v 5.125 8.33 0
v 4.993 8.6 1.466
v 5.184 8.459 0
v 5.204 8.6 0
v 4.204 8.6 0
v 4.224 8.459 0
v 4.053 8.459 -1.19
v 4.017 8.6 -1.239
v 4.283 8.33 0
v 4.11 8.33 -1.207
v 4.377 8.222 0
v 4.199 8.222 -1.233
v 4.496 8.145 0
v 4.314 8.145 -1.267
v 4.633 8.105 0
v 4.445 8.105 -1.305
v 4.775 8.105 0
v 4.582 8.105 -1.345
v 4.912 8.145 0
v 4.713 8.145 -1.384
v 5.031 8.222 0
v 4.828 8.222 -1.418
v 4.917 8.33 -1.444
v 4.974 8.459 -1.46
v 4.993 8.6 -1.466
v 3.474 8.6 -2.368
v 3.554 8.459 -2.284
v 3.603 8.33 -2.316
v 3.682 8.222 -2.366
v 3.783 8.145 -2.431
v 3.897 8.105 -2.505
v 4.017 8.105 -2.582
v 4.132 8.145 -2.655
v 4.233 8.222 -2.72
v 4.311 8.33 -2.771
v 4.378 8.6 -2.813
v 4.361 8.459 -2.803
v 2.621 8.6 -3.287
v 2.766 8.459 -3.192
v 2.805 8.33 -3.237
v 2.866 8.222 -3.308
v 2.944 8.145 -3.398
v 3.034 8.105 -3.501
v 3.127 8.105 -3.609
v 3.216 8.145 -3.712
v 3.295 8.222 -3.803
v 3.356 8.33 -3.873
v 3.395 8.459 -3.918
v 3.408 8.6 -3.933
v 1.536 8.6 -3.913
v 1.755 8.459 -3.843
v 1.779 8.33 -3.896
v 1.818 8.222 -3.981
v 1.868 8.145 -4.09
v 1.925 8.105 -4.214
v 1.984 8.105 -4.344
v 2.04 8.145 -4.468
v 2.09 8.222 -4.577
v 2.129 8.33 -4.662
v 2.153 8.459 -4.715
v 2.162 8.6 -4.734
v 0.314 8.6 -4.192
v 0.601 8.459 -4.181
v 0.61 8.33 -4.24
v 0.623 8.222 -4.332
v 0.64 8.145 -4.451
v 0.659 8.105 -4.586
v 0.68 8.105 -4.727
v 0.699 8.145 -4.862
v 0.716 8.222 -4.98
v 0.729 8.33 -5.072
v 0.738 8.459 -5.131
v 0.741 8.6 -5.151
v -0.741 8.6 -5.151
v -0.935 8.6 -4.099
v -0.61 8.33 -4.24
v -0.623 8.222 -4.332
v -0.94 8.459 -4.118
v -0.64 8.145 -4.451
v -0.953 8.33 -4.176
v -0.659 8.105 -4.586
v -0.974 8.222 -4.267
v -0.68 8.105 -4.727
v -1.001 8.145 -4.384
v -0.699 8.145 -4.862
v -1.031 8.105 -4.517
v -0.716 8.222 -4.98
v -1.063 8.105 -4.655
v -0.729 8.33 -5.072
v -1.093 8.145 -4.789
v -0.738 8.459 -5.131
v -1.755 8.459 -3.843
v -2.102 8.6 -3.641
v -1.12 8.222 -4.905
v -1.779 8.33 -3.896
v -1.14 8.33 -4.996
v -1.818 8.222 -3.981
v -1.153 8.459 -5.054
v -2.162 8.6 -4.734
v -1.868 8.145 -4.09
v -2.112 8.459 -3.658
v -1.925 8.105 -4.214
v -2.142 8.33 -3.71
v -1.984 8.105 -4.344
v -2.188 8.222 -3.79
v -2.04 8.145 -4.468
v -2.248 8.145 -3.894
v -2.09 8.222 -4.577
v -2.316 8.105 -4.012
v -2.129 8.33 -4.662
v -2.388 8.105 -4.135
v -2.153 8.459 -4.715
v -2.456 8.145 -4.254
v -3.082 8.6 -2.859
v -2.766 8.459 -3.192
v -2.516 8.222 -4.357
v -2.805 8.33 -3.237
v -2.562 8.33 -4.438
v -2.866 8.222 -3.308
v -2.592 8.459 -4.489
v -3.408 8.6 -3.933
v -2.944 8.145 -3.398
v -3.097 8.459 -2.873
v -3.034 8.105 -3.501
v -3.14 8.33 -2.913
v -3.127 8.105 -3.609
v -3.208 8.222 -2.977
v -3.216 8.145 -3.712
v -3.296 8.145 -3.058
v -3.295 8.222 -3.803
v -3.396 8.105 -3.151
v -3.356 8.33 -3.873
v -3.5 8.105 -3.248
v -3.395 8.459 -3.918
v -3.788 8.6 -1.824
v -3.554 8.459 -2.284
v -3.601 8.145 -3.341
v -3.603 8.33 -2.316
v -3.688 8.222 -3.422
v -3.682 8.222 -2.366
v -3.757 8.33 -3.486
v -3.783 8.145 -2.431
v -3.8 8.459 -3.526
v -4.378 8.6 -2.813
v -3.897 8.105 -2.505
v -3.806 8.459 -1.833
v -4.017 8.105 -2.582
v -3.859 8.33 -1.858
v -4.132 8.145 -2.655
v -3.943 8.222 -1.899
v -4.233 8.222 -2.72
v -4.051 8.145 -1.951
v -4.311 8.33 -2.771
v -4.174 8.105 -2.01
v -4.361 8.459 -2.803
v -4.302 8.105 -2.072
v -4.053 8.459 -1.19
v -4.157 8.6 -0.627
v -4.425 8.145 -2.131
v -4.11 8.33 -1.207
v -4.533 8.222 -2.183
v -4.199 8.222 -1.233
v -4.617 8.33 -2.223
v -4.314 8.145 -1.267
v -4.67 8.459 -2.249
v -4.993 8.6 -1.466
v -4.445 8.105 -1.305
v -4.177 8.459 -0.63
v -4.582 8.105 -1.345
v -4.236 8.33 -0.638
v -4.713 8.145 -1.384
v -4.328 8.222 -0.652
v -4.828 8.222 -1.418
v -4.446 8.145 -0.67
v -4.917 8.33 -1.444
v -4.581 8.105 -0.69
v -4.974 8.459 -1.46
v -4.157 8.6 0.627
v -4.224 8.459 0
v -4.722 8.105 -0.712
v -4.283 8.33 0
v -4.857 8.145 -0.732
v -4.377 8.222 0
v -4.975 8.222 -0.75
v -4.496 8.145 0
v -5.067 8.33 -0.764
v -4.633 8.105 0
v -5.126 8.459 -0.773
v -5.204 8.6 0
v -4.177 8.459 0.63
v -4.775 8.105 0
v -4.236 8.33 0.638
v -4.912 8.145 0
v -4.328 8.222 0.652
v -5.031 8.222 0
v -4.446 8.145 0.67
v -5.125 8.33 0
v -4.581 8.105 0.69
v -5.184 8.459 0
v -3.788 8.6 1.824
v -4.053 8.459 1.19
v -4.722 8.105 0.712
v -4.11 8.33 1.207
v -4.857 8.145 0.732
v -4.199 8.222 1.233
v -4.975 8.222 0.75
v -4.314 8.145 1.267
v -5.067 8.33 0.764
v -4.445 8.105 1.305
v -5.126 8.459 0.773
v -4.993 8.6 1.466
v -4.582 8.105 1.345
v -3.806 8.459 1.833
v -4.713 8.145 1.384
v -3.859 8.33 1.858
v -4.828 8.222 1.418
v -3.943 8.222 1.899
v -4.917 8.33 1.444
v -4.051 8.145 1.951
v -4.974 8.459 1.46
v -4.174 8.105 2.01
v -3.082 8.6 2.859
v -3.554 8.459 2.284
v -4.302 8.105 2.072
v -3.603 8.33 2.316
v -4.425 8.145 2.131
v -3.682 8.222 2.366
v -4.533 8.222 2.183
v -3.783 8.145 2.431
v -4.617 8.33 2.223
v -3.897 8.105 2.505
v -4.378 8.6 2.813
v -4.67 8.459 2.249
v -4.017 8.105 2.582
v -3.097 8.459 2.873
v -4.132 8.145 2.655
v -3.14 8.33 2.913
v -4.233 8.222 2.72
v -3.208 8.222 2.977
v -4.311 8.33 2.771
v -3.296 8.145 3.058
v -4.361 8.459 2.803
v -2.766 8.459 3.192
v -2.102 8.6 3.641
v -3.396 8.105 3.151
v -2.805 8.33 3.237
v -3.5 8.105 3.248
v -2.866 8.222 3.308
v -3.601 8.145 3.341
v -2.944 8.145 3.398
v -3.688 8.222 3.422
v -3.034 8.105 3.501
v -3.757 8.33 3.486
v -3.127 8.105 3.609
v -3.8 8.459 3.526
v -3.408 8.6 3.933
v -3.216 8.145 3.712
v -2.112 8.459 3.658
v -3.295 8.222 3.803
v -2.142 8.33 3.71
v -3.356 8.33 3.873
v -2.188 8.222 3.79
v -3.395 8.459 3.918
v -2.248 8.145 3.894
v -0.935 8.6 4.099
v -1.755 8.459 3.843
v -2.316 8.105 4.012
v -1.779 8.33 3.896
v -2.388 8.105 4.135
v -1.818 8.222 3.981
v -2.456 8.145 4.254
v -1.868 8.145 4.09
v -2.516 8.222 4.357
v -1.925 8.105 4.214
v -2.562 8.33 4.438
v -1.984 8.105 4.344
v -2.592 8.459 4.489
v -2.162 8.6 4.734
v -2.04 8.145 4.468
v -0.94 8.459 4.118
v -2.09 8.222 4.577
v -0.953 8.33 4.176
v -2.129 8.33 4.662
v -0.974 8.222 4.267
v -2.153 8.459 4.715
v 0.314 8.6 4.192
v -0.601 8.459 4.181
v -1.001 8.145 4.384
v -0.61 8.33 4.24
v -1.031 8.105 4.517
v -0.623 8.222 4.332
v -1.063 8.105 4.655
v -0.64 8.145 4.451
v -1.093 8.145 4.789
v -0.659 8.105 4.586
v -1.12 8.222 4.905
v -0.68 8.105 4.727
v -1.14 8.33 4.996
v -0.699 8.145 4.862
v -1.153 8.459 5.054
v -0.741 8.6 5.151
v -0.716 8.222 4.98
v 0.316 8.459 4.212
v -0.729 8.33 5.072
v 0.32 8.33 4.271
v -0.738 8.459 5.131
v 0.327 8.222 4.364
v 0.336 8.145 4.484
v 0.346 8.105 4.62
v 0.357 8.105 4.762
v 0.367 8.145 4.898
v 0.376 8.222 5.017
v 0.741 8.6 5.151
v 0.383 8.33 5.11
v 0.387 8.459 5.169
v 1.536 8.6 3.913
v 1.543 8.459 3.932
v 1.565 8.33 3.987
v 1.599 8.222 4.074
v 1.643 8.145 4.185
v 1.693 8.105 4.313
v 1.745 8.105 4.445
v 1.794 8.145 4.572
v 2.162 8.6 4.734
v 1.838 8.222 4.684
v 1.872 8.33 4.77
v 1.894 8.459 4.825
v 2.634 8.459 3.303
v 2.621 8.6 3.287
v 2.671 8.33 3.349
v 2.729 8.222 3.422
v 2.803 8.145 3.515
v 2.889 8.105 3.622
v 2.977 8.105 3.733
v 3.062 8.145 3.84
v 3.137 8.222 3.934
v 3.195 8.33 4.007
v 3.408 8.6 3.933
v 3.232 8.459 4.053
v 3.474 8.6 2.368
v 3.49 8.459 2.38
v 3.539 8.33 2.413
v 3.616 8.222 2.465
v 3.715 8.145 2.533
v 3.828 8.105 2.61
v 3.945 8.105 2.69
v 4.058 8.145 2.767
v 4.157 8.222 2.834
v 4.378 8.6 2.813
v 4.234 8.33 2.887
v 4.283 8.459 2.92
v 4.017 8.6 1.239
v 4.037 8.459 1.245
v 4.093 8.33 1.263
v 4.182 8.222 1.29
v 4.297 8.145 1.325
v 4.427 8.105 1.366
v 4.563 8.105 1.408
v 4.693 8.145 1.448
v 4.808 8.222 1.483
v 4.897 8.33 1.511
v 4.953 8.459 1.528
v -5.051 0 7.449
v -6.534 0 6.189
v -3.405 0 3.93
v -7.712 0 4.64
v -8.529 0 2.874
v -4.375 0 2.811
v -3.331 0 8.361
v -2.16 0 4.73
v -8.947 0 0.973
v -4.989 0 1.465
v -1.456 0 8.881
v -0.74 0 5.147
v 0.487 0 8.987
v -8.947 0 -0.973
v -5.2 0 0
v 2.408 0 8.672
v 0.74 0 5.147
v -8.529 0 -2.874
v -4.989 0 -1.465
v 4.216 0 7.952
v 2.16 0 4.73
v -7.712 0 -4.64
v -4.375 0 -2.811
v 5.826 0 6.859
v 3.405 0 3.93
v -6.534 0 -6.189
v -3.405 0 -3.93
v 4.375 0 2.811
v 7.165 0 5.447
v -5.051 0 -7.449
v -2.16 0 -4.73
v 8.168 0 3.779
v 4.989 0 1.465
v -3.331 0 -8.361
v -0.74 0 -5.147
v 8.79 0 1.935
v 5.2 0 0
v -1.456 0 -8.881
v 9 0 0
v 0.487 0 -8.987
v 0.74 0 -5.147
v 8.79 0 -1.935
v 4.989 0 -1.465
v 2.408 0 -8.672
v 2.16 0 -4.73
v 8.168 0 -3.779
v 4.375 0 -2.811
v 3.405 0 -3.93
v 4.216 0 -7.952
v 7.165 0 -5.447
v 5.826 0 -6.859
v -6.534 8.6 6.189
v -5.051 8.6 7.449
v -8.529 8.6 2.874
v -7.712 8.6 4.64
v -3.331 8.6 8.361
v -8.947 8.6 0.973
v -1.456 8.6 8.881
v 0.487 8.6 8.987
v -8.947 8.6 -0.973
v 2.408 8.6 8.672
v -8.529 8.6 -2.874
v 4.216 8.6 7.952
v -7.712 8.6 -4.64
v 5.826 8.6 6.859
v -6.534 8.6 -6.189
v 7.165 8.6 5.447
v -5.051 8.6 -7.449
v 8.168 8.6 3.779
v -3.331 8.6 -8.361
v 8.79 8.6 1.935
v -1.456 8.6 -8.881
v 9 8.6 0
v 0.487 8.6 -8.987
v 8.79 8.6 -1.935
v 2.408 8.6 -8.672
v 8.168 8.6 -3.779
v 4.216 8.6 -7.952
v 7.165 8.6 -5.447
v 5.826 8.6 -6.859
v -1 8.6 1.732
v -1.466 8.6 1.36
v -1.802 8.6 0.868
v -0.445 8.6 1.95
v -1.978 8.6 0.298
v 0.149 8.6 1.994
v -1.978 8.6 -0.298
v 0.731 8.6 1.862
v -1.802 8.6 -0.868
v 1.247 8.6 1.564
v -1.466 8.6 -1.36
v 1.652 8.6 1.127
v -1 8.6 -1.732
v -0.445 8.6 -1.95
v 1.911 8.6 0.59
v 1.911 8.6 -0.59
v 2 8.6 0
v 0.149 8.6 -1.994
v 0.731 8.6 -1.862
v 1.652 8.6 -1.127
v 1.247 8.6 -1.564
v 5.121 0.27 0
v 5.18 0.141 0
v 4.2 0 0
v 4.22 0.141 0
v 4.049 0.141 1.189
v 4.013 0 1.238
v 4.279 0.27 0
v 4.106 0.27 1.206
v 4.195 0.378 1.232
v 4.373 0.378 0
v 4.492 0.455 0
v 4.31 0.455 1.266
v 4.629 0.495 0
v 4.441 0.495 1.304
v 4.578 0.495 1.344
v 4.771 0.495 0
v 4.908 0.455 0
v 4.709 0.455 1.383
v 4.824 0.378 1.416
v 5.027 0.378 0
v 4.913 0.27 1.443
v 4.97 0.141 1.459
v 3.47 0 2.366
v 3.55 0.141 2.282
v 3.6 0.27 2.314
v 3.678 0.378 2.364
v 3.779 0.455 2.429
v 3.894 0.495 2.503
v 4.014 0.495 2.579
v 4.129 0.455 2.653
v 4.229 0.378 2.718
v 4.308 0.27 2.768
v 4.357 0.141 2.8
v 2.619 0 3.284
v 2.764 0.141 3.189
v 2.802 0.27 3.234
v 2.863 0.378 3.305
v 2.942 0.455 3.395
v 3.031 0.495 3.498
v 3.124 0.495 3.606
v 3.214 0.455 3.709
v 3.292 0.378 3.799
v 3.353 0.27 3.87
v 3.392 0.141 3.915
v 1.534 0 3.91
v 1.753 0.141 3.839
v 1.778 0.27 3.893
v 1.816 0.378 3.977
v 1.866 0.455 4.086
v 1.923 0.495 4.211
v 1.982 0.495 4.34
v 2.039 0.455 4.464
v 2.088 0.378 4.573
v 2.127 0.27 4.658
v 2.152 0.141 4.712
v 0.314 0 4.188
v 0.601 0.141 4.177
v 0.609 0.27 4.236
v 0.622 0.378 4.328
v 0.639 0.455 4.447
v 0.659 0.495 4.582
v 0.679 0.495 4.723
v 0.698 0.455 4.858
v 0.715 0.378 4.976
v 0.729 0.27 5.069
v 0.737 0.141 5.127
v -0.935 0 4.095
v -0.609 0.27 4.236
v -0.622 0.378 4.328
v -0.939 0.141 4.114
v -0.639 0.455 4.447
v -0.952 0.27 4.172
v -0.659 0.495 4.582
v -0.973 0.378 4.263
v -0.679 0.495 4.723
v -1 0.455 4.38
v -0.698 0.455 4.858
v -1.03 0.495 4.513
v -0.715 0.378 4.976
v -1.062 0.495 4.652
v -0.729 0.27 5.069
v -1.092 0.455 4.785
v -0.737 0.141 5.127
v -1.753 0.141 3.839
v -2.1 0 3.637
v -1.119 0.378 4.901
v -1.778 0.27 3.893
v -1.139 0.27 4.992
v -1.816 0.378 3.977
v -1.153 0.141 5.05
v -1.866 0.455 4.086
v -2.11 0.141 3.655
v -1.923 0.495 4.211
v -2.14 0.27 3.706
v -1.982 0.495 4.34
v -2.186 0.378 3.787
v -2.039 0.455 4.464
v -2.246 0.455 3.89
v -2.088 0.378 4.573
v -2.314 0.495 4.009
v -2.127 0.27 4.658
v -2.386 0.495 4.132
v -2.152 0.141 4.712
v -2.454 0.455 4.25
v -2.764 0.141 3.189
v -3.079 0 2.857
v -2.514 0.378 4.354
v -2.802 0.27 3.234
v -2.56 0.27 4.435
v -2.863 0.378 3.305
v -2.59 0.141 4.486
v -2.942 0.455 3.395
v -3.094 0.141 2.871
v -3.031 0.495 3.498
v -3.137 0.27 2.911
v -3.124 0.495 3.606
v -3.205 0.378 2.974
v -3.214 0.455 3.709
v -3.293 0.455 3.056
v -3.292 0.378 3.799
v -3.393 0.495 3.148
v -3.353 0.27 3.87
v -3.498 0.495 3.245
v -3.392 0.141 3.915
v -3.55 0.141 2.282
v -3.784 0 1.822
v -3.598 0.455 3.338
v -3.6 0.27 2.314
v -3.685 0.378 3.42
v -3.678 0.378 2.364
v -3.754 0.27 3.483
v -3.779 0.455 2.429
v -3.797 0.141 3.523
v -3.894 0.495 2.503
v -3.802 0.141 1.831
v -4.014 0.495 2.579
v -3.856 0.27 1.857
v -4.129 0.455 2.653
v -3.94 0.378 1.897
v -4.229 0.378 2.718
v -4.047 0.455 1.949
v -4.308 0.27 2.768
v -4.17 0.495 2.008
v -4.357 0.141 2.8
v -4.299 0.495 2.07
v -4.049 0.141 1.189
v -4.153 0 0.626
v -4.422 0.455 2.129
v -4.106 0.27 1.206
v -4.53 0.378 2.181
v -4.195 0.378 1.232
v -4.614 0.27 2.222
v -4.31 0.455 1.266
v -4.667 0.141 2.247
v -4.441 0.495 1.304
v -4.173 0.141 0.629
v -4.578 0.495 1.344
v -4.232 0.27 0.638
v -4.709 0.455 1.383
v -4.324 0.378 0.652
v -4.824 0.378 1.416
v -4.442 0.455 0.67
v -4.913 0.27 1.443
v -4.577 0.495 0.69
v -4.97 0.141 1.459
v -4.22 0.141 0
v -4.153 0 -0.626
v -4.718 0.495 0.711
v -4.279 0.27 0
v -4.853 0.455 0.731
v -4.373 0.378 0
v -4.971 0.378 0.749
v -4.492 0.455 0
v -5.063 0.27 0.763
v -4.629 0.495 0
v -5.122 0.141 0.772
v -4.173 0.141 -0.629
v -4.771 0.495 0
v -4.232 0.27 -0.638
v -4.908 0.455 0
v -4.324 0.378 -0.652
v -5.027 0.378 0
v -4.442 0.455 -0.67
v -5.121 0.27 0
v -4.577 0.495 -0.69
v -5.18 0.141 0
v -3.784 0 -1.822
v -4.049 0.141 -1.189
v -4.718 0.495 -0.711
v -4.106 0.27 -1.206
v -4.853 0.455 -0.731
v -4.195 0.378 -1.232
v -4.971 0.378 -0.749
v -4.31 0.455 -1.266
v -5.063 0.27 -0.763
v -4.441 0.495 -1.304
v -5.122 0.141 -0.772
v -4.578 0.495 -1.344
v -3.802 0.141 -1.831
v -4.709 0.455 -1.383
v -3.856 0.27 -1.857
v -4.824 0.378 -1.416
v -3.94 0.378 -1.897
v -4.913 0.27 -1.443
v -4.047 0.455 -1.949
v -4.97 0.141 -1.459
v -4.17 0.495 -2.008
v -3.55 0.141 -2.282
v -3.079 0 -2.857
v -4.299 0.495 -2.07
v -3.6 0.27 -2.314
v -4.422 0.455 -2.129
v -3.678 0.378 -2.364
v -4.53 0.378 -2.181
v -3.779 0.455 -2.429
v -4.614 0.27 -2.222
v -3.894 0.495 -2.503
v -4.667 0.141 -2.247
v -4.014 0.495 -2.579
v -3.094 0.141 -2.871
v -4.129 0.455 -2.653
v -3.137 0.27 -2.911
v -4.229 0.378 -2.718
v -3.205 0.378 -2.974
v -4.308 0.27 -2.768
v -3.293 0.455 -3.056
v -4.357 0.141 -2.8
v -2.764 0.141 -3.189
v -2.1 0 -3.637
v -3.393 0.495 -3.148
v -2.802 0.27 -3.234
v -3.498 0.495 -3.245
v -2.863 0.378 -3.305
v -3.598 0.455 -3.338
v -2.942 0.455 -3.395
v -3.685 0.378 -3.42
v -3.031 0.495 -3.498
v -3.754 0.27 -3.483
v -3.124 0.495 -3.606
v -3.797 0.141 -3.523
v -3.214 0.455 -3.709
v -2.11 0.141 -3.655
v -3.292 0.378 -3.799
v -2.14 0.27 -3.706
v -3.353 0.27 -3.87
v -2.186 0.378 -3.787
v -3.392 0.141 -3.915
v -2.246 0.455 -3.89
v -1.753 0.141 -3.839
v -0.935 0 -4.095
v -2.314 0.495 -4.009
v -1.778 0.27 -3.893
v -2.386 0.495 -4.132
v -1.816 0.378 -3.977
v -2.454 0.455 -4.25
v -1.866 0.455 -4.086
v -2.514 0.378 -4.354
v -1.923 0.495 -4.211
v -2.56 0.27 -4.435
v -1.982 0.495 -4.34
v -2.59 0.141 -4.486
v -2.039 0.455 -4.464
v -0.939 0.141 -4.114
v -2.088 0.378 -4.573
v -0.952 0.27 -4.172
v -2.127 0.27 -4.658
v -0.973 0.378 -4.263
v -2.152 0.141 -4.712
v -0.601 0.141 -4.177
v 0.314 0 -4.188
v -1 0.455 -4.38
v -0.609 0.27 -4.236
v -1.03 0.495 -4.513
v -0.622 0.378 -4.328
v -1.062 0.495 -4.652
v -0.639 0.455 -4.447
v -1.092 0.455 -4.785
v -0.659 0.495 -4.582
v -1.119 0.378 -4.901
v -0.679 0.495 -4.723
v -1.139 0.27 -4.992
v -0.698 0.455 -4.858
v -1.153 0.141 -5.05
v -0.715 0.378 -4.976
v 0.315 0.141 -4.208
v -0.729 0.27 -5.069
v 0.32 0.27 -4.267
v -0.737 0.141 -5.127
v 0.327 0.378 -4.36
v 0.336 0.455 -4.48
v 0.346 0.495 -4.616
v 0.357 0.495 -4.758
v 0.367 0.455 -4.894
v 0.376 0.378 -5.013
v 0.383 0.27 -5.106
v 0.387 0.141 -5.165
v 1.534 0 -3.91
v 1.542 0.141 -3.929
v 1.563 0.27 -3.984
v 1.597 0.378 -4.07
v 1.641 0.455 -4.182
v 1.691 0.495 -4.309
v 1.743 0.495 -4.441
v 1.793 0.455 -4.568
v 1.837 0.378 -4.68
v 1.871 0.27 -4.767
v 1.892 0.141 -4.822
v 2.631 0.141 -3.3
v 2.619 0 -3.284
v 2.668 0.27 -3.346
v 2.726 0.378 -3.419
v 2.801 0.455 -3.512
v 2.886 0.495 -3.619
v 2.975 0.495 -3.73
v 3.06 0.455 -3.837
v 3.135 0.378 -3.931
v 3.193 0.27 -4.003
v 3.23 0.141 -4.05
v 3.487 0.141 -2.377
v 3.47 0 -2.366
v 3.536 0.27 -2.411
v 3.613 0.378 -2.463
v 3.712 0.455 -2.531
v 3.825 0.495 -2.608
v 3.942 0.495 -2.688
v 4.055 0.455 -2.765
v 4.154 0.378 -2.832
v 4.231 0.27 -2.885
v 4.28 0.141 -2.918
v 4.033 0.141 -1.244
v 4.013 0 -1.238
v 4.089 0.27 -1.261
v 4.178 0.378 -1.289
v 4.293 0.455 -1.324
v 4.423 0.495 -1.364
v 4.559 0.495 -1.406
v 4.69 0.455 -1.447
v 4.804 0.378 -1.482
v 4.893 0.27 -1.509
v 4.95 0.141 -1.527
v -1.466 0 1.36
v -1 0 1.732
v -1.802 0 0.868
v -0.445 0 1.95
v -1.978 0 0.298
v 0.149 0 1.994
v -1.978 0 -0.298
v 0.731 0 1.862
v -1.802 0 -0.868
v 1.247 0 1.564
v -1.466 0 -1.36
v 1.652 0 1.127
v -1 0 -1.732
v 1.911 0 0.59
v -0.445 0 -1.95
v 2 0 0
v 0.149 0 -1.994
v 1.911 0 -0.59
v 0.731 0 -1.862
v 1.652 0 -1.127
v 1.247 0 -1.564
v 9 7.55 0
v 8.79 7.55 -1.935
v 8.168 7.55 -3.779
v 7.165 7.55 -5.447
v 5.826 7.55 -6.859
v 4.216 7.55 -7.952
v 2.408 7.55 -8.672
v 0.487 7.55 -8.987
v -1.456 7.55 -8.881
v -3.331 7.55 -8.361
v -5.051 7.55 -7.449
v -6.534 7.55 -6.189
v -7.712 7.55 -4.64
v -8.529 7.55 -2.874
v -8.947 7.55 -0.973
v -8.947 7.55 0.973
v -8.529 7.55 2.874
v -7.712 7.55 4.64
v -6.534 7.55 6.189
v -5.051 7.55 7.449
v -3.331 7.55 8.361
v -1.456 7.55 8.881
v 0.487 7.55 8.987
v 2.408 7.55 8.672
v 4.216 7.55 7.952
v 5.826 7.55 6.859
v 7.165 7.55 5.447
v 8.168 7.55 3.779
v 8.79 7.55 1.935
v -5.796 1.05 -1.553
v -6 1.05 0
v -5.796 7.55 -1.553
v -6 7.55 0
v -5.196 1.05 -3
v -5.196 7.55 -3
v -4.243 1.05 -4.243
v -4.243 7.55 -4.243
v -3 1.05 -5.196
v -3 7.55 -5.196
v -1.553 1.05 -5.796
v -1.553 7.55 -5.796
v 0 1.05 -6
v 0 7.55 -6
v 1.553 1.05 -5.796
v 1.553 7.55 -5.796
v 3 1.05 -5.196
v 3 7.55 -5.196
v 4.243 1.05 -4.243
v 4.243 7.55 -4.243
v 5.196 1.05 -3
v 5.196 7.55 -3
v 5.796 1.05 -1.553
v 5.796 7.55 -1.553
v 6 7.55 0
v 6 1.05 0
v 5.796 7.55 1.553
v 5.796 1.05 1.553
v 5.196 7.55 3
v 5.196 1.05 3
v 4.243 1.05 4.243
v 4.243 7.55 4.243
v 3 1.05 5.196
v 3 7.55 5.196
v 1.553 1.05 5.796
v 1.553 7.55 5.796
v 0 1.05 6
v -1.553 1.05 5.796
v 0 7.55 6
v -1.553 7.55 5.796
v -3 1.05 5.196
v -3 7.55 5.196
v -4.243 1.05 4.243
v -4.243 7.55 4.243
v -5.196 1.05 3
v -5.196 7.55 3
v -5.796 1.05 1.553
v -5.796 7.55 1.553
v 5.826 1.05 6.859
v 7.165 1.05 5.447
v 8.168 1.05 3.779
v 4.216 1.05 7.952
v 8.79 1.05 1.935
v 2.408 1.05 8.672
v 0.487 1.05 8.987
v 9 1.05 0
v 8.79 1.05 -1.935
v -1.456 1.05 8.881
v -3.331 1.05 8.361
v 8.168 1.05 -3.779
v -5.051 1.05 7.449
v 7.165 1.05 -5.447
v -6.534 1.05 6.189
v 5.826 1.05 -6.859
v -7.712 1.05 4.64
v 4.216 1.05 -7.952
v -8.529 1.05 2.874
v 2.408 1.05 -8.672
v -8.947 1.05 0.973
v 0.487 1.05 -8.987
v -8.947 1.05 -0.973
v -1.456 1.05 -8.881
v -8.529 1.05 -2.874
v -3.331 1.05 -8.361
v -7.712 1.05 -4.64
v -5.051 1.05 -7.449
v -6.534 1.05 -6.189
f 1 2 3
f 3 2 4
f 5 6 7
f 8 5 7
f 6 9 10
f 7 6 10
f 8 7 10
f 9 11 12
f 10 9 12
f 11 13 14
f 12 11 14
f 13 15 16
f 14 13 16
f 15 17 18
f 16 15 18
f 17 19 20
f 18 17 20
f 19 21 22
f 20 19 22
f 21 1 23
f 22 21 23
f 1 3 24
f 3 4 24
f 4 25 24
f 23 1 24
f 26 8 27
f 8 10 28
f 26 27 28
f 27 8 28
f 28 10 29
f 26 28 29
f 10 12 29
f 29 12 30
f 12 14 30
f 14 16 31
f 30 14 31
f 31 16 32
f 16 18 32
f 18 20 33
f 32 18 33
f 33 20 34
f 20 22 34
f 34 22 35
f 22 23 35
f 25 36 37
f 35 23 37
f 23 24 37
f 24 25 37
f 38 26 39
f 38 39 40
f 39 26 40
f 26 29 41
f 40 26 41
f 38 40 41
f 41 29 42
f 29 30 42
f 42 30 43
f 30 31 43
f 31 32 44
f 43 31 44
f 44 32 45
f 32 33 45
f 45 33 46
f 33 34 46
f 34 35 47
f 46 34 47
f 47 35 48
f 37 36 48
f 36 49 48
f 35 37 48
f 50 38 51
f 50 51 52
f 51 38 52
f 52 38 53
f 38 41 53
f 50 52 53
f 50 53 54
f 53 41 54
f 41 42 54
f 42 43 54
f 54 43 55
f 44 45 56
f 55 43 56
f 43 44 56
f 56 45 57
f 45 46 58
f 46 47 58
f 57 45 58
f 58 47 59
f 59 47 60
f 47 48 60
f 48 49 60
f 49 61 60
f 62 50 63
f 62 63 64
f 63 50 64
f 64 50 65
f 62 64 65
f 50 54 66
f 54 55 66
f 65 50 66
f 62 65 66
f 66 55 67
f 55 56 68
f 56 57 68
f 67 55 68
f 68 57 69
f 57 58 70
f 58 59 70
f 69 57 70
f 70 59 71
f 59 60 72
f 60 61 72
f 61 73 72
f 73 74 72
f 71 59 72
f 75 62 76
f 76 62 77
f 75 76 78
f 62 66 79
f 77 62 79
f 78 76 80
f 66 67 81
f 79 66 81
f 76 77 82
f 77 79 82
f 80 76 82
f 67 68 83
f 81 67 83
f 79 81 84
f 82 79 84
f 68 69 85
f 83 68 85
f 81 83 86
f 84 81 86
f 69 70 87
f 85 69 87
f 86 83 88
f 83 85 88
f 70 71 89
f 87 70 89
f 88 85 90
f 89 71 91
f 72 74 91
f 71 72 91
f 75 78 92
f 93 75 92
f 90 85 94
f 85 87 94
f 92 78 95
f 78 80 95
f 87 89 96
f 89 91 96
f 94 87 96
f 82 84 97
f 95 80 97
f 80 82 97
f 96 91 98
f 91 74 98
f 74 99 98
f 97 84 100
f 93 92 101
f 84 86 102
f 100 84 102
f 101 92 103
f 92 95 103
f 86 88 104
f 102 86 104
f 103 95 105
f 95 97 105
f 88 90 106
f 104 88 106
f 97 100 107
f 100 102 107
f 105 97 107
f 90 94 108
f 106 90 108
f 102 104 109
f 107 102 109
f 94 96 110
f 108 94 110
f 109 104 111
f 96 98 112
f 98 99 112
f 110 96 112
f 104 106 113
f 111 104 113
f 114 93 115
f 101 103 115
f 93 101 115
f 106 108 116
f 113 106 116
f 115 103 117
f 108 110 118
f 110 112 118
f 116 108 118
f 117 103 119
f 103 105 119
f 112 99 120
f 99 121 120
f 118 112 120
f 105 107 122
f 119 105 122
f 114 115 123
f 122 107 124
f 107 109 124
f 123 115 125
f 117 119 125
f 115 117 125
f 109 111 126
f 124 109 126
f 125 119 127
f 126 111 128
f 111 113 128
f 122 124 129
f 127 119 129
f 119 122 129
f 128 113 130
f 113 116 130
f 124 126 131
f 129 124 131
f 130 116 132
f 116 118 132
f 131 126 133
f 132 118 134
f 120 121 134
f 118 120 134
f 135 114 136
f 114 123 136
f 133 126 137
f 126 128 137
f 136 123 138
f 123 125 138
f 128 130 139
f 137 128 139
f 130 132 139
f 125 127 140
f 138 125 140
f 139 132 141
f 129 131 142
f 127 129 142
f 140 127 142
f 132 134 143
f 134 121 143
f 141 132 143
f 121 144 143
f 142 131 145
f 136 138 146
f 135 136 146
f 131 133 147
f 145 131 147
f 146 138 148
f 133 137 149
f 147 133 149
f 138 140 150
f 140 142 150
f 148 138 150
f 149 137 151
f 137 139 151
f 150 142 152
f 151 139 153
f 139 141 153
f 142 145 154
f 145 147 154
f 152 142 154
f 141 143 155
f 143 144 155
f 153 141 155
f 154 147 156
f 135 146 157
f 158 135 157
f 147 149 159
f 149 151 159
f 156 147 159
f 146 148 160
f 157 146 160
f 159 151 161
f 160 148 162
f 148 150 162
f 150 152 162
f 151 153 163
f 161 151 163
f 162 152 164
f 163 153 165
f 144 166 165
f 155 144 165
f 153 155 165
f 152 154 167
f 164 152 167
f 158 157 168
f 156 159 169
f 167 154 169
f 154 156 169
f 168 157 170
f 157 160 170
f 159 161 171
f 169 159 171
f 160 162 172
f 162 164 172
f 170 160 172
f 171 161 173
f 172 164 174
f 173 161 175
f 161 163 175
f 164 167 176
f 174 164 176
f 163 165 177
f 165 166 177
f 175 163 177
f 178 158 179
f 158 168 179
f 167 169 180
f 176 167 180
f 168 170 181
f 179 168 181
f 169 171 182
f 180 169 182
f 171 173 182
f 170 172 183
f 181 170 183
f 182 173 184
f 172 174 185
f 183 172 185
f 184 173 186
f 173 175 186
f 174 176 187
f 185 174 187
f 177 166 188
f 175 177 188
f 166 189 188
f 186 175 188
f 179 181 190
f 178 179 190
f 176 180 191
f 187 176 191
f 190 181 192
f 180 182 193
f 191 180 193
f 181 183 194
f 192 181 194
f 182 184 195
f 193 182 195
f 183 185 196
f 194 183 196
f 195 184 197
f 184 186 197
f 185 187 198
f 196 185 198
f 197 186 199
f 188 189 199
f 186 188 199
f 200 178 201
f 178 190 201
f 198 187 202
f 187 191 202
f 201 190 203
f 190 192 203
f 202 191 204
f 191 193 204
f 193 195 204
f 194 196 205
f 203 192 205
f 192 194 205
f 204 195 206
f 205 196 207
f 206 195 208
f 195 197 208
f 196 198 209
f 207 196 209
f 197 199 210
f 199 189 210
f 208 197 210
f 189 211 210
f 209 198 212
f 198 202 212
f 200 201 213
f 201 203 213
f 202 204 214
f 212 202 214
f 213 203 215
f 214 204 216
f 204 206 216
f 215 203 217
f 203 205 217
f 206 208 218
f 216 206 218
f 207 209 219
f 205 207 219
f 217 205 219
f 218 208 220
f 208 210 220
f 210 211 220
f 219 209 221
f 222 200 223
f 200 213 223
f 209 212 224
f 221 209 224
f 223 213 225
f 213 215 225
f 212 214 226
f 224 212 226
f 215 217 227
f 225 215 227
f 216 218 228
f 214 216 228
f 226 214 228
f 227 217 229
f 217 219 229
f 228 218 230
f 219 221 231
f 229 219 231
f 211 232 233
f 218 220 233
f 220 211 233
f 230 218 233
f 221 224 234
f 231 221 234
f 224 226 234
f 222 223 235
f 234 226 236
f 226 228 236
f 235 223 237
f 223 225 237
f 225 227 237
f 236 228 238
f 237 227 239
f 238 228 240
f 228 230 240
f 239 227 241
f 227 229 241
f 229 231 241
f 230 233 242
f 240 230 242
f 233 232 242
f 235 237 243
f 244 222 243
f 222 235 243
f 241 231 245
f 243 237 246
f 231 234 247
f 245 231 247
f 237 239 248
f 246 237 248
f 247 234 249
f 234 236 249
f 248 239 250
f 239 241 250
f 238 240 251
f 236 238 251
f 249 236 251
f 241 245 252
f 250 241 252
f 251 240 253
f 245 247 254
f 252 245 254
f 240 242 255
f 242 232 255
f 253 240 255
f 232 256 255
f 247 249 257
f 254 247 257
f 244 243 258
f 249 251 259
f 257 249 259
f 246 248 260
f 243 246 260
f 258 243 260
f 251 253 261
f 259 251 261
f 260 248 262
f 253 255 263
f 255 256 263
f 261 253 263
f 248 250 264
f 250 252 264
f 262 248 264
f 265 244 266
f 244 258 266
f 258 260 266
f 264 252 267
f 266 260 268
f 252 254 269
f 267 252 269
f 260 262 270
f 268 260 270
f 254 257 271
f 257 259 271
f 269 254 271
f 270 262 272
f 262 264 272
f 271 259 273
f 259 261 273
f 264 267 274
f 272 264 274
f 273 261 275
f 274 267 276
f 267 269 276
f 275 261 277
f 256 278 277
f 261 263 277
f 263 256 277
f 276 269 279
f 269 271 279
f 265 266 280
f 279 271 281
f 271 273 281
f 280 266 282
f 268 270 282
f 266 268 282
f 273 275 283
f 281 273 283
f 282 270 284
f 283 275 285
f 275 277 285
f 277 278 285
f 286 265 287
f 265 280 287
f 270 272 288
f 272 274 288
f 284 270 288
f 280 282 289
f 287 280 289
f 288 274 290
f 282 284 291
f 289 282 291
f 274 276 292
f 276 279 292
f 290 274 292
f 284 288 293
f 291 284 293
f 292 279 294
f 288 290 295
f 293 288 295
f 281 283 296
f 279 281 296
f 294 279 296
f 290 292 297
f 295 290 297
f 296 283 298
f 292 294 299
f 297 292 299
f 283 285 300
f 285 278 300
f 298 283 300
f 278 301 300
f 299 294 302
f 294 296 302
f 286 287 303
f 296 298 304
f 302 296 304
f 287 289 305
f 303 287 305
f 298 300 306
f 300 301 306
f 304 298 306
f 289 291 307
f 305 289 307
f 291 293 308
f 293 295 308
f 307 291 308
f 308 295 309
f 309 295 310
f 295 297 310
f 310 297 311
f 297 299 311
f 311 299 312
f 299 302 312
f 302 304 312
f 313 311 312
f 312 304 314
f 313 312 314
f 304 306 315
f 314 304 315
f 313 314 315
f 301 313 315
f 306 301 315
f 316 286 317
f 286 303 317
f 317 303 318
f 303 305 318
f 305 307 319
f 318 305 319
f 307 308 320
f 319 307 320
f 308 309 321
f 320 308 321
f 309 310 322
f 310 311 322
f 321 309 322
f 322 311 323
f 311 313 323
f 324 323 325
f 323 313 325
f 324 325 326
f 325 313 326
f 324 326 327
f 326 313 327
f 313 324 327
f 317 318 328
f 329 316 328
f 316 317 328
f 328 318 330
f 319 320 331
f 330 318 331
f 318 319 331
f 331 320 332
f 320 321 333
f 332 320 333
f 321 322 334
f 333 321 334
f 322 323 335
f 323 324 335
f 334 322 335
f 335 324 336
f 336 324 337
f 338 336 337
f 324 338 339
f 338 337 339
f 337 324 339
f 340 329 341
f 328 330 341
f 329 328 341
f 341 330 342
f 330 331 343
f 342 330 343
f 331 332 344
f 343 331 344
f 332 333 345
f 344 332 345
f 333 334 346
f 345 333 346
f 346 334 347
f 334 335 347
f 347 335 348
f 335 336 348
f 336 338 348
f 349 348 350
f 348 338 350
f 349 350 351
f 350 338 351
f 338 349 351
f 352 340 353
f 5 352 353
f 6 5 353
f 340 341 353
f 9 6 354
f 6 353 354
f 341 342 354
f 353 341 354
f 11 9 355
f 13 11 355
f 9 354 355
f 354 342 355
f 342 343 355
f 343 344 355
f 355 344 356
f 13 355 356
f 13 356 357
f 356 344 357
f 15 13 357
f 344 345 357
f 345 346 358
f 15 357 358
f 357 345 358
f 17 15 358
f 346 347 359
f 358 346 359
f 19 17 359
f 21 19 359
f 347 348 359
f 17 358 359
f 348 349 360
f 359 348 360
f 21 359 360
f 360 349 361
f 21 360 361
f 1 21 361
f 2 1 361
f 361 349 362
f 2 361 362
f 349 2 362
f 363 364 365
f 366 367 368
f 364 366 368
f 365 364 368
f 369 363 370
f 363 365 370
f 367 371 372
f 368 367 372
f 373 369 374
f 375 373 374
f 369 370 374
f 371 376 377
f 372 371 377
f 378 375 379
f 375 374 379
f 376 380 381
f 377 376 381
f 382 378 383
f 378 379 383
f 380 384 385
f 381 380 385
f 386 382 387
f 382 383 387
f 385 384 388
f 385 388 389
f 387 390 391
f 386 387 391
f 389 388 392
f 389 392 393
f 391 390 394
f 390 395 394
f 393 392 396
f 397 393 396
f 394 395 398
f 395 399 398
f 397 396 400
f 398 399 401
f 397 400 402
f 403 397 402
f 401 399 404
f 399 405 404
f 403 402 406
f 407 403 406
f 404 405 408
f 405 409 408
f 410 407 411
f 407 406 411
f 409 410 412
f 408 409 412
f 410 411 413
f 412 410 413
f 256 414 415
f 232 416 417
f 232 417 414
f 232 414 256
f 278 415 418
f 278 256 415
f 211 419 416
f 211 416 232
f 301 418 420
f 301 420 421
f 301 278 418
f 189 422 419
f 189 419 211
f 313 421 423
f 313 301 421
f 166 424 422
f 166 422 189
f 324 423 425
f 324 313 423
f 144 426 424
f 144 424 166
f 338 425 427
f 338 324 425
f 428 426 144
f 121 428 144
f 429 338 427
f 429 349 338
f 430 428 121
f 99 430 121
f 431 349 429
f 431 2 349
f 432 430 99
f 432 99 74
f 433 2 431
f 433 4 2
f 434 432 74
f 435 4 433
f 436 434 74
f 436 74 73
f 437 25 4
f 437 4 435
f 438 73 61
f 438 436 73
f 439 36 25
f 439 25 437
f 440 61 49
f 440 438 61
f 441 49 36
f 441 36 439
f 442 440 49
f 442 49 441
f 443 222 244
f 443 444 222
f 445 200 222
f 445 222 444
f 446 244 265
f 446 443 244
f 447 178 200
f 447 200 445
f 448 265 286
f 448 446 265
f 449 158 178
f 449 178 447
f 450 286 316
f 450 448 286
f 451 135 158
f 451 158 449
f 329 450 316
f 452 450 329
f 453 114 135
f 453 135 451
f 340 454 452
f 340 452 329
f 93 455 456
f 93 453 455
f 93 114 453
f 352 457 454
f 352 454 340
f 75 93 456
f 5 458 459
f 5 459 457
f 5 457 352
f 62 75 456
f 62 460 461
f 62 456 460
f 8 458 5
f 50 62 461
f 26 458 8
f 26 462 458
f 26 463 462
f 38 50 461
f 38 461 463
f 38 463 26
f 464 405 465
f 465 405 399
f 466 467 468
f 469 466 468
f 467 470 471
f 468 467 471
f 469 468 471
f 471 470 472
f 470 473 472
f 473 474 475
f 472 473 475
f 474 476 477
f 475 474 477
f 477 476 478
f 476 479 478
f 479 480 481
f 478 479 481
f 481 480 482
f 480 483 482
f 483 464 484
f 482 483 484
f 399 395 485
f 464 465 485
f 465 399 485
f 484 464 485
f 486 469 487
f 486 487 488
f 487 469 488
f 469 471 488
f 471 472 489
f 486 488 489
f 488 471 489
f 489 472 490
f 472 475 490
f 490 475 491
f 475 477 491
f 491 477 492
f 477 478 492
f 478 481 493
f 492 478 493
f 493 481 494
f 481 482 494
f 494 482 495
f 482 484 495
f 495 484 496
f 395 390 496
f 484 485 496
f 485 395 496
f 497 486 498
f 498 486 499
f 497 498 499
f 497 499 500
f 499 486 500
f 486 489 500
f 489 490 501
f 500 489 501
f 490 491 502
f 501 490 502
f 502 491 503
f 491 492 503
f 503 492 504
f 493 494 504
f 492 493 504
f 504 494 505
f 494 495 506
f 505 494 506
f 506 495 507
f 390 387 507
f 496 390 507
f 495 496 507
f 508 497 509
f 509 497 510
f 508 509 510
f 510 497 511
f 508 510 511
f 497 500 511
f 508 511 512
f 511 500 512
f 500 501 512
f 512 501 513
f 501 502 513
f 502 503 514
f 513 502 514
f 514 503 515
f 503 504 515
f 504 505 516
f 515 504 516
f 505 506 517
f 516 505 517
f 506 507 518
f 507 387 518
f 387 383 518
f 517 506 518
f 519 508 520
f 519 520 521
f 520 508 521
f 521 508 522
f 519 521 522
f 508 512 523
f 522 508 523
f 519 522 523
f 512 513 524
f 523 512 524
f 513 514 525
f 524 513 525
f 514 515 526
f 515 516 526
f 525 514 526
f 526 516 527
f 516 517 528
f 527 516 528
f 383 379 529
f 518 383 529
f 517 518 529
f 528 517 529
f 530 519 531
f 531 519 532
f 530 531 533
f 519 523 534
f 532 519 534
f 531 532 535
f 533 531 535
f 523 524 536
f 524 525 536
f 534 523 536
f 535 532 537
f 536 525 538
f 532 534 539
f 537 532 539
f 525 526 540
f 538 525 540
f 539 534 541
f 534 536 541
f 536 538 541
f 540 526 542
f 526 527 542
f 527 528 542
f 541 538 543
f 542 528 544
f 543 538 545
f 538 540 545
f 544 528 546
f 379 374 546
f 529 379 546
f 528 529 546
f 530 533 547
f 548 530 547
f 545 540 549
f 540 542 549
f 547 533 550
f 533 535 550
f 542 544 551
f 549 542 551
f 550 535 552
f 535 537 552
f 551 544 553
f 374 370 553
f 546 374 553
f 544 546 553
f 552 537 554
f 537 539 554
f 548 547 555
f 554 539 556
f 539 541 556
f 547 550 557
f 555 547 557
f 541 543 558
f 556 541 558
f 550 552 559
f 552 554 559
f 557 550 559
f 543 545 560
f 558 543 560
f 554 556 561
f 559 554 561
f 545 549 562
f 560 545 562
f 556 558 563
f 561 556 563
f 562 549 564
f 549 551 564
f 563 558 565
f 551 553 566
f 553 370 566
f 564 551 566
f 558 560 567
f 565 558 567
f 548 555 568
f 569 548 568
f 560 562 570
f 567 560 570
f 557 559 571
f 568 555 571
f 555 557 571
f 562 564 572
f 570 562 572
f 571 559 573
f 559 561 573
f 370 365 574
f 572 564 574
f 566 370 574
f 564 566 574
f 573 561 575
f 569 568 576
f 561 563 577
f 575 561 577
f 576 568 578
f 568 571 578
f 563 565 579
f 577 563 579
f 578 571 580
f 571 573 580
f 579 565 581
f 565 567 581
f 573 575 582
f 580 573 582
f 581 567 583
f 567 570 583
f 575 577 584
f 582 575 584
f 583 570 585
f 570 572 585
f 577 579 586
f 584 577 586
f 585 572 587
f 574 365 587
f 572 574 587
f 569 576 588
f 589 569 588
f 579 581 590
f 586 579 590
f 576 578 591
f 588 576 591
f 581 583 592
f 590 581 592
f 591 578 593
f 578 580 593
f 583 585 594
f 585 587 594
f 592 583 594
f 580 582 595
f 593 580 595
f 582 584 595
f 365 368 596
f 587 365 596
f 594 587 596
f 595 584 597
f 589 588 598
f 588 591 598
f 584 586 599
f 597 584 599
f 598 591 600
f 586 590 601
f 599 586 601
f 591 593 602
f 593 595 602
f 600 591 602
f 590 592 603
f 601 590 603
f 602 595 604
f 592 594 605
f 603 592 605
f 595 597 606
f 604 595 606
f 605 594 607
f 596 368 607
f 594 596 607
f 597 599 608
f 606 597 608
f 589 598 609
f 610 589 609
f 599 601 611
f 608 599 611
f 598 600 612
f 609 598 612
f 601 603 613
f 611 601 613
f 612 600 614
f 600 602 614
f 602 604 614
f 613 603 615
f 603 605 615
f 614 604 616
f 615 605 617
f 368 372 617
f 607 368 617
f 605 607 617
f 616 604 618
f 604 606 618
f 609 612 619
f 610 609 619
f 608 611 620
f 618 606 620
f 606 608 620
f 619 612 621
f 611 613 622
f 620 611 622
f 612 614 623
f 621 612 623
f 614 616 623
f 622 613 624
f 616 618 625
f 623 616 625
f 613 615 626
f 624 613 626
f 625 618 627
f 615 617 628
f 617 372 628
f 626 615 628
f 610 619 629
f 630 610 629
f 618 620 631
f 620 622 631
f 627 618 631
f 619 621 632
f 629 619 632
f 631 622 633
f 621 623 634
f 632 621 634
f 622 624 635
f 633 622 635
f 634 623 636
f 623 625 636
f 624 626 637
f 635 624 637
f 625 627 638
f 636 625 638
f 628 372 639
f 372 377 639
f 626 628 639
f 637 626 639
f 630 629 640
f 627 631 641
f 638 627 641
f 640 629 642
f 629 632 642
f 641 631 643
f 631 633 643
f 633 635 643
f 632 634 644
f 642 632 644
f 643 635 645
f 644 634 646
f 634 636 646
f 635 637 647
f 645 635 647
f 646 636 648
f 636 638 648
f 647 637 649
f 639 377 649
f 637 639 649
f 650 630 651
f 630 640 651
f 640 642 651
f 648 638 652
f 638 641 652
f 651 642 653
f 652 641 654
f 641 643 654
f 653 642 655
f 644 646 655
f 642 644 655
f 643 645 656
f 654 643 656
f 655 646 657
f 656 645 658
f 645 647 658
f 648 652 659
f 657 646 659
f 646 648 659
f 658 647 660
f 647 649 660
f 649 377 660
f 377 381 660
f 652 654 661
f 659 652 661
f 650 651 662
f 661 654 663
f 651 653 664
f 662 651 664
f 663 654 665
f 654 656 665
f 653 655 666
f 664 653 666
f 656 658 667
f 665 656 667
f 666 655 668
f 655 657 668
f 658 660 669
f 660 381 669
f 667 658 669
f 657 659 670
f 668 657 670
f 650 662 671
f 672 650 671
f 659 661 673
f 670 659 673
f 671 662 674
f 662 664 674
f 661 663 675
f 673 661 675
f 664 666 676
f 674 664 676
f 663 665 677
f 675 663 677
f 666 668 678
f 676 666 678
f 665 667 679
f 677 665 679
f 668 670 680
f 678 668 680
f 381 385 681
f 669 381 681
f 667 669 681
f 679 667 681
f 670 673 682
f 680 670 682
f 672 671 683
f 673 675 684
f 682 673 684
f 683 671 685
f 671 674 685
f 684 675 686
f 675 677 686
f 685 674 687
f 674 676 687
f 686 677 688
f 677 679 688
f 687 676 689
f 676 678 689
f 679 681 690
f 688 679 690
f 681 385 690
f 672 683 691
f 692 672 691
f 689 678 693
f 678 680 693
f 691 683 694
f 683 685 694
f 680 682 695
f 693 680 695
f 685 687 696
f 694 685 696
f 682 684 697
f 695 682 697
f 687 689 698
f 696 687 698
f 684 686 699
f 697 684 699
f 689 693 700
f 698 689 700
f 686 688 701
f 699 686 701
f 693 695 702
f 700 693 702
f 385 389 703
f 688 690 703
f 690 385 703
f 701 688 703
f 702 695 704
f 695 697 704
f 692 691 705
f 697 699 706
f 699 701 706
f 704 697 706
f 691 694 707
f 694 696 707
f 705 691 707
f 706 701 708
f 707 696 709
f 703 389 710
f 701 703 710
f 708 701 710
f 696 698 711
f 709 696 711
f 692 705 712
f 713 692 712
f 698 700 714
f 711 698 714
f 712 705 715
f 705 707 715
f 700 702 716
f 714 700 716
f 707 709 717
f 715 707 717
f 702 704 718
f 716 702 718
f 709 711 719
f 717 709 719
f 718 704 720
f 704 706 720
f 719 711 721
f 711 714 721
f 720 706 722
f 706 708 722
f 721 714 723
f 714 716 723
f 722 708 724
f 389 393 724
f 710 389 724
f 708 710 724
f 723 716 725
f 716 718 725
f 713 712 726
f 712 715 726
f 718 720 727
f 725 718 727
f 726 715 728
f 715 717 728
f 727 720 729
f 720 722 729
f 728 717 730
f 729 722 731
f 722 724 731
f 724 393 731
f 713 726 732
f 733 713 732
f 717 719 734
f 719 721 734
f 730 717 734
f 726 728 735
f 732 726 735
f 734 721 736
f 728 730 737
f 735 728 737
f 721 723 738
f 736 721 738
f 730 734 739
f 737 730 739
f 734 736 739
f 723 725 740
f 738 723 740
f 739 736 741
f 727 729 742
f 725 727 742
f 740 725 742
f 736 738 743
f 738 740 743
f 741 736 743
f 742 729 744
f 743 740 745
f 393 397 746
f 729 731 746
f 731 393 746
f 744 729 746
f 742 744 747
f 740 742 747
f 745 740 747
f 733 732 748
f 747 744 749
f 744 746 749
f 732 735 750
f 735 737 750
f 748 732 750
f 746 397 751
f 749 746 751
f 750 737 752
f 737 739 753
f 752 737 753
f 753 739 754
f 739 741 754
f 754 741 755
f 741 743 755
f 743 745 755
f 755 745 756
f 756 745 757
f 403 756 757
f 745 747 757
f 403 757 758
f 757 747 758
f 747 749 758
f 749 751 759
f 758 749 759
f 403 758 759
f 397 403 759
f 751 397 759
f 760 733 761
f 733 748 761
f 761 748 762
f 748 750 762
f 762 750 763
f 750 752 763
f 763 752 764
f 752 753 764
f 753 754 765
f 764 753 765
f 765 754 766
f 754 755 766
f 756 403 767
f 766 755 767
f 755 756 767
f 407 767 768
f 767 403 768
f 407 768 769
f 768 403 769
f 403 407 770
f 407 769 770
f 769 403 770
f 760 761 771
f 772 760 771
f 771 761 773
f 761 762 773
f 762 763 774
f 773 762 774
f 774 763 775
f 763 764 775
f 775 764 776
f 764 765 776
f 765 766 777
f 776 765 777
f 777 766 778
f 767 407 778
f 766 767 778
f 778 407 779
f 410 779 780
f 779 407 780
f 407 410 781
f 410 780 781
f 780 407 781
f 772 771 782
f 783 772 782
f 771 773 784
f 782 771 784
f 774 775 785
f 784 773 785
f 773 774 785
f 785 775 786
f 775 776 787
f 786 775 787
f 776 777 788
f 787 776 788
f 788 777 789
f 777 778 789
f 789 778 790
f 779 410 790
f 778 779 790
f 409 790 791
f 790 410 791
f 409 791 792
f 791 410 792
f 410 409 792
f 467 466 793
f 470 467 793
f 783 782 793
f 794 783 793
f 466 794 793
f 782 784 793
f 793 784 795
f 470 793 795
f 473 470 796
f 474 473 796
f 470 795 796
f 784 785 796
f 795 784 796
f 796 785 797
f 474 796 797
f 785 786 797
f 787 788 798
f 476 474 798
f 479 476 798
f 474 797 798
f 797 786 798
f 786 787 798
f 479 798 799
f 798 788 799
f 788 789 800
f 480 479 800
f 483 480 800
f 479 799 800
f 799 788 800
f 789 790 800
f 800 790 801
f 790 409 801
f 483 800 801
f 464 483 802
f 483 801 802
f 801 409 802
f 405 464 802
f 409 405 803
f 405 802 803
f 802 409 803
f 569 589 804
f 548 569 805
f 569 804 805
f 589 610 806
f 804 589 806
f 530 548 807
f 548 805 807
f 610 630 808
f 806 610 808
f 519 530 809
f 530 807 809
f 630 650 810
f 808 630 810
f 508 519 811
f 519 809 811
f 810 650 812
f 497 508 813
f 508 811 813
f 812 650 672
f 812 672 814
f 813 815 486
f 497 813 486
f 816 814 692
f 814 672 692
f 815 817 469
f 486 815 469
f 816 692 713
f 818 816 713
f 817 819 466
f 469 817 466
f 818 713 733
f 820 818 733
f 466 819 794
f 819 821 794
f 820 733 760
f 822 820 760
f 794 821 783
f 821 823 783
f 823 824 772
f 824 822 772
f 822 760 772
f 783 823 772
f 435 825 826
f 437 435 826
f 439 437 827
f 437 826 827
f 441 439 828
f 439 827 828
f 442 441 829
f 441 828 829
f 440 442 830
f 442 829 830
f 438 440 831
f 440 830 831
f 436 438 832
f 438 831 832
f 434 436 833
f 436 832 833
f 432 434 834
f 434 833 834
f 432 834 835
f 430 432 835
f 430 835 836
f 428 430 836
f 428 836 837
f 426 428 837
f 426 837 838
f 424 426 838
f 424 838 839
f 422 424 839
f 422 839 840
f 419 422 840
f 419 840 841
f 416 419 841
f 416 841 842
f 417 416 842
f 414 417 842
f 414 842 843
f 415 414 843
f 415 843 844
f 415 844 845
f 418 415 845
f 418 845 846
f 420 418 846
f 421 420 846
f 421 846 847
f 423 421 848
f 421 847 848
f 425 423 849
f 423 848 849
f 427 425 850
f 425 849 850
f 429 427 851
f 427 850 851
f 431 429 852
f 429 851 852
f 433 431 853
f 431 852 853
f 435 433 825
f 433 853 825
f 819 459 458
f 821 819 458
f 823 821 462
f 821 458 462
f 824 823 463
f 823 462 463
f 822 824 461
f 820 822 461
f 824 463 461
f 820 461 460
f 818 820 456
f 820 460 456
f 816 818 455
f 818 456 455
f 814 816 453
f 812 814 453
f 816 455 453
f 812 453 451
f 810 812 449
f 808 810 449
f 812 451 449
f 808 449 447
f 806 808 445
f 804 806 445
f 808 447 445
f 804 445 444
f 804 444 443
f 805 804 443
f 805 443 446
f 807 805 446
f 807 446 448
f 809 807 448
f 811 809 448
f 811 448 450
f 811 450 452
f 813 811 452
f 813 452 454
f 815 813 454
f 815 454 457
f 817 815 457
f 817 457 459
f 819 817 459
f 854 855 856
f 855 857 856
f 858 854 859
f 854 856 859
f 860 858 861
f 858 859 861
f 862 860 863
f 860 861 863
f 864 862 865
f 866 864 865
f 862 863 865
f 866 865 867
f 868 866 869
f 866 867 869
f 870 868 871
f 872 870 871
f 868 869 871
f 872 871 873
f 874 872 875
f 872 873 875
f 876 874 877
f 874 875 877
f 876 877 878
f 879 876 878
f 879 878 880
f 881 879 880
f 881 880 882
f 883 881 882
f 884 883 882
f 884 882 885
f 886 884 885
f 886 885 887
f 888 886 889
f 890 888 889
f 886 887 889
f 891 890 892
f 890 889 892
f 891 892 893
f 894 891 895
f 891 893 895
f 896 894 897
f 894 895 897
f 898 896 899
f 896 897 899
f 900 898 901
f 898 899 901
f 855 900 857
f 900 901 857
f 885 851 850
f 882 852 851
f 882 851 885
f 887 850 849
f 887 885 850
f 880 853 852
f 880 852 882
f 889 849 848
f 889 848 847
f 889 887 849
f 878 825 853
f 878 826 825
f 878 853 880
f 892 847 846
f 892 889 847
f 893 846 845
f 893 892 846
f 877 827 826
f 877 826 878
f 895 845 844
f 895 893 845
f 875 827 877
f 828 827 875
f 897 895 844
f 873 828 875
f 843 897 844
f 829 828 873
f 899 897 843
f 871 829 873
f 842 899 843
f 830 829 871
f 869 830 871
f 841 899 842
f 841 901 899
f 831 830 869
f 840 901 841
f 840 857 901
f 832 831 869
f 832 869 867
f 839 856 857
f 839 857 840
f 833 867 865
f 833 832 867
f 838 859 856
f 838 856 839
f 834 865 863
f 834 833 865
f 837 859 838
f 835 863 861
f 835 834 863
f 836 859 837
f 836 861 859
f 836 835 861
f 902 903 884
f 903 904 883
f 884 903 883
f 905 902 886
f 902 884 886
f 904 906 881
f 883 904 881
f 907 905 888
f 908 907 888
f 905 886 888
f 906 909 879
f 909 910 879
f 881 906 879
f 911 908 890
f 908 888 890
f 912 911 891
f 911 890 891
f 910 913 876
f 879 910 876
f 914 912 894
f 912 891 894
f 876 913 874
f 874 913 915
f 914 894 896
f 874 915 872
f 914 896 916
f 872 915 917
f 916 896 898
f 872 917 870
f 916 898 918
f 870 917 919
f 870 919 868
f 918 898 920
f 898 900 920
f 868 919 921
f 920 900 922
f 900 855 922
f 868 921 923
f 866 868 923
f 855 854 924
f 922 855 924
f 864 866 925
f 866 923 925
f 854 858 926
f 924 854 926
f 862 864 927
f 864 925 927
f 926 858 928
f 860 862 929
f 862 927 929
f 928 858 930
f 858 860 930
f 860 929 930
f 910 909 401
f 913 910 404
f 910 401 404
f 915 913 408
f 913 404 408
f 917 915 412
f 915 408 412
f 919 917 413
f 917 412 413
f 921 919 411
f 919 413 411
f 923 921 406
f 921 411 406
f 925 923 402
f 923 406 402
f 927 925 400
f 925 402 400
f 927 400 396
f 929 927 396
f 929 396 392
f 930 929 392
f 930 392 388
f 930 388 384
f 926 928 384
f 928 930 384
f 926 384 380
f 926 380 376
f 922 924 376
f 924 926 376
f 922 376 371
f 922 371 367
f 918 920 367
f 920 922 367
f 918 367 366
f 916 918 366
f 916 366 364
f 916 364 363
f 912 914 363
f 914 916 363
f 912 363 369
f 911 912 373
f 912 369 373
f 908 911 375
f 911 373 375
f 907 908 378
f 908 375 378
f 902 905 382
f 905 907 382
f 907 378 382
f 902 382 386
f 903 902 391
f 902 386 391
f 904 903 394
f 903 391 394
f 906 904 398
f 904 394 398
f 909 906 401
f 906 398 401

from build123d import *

# Parameters (mm, degrees)
SKETCH1_R            = 9
BOSS_EXTRUDE1_DEPTH  = 8.6
SKETCH2_W            = 9.699094827
SKETCH2_H            = 6.5
SKETCH3_R            = 2
CUT_EXTRUDE1_DEPTH   = 9.6
CUT_SWEEP2_PROFILE_R = 0.5
CUT_SWEEP3_PROFILE_R = 0.5


with BuildPart() as part:
    # Sketch1 → Boss-Extrude1 (new body)
    with BuildSketch(Plane(origin=(0, 0, 0), x_dir=(1, 0, 0), z_dir=(0, 1, 0))):
        Circle(SKETCH1_R)
    extrude(amount=BOSS_EXTRUDE1_DEPTH)

    # Sketch2 → Cut-Revolve1 (revolve, cut)
    with BuildSketch(Plane.XY):
        with Locations((-10.849547414, 4.3)):
            Rectangle(SKETCH2_W, SKETCH2_H)
    revolve(axis=Axis((0, 8.6, 0), (0, -1, 0)), mode=Mode.SUBTRACT)

    # Sketch3 → Cut-Extrude1 (cut, through all)
    with BuildSketch(Plane(origin=(0, 8.6, 0), x_dir=(1, 0, 0), z_dir=(0, 1, 0))):
        Circle(SKETCH3_R)
    extrude(amount=-CUT_EXTRUDE1_DEPTH, mode=Mode.SUBTRACT)

    # Cut-Sweep2: sweep along a path in Sketch4
    with BuildLine(Plane(origin=(0, 8.6, 0), x_dir=(1, 0, 0), z_dir=(0, 1, 0))) as cut_sweep2_path:
        CenterArc((0, 0), 4.703999497, 0, 360)
    # Cut-Sweep2 profile (on start of the path) → Cut-Sweep2 (sweep, cut)
    with BuildSketch(Plane(origin=(4.703999497, 8.6, 0), x_dir=(-1, 0, 0), z_dir=(0, 0, -1))):
        Circle(CUT_SWEEP2_PROFILE_R)
    sweep(path=cut_sweep2_path.line, mode=Mode.SUBTRACT)

    # Cut-Sweep3: sweep along a path in Sketch20
    with BuildLine(Plane.XZ) as cut_sweep3_path:
        CenterArc((0, 0), 4.7, 0, 360)
    # Cut-Sweep3 profile (on start of the path) → Cut-Sweep3 (sweep, cut)
    with BuildSketch(Plane(origin=(4.7, 0, 0), x_dir=(1, 0, 0), z_dir=(0, 0, 1))):
        Circle(CUT_SWEEP3_PROFILE_R)
    sweep(path=cut_sweep3_path.line, mode=Mode.SUBTRACT)


solid = part.part
